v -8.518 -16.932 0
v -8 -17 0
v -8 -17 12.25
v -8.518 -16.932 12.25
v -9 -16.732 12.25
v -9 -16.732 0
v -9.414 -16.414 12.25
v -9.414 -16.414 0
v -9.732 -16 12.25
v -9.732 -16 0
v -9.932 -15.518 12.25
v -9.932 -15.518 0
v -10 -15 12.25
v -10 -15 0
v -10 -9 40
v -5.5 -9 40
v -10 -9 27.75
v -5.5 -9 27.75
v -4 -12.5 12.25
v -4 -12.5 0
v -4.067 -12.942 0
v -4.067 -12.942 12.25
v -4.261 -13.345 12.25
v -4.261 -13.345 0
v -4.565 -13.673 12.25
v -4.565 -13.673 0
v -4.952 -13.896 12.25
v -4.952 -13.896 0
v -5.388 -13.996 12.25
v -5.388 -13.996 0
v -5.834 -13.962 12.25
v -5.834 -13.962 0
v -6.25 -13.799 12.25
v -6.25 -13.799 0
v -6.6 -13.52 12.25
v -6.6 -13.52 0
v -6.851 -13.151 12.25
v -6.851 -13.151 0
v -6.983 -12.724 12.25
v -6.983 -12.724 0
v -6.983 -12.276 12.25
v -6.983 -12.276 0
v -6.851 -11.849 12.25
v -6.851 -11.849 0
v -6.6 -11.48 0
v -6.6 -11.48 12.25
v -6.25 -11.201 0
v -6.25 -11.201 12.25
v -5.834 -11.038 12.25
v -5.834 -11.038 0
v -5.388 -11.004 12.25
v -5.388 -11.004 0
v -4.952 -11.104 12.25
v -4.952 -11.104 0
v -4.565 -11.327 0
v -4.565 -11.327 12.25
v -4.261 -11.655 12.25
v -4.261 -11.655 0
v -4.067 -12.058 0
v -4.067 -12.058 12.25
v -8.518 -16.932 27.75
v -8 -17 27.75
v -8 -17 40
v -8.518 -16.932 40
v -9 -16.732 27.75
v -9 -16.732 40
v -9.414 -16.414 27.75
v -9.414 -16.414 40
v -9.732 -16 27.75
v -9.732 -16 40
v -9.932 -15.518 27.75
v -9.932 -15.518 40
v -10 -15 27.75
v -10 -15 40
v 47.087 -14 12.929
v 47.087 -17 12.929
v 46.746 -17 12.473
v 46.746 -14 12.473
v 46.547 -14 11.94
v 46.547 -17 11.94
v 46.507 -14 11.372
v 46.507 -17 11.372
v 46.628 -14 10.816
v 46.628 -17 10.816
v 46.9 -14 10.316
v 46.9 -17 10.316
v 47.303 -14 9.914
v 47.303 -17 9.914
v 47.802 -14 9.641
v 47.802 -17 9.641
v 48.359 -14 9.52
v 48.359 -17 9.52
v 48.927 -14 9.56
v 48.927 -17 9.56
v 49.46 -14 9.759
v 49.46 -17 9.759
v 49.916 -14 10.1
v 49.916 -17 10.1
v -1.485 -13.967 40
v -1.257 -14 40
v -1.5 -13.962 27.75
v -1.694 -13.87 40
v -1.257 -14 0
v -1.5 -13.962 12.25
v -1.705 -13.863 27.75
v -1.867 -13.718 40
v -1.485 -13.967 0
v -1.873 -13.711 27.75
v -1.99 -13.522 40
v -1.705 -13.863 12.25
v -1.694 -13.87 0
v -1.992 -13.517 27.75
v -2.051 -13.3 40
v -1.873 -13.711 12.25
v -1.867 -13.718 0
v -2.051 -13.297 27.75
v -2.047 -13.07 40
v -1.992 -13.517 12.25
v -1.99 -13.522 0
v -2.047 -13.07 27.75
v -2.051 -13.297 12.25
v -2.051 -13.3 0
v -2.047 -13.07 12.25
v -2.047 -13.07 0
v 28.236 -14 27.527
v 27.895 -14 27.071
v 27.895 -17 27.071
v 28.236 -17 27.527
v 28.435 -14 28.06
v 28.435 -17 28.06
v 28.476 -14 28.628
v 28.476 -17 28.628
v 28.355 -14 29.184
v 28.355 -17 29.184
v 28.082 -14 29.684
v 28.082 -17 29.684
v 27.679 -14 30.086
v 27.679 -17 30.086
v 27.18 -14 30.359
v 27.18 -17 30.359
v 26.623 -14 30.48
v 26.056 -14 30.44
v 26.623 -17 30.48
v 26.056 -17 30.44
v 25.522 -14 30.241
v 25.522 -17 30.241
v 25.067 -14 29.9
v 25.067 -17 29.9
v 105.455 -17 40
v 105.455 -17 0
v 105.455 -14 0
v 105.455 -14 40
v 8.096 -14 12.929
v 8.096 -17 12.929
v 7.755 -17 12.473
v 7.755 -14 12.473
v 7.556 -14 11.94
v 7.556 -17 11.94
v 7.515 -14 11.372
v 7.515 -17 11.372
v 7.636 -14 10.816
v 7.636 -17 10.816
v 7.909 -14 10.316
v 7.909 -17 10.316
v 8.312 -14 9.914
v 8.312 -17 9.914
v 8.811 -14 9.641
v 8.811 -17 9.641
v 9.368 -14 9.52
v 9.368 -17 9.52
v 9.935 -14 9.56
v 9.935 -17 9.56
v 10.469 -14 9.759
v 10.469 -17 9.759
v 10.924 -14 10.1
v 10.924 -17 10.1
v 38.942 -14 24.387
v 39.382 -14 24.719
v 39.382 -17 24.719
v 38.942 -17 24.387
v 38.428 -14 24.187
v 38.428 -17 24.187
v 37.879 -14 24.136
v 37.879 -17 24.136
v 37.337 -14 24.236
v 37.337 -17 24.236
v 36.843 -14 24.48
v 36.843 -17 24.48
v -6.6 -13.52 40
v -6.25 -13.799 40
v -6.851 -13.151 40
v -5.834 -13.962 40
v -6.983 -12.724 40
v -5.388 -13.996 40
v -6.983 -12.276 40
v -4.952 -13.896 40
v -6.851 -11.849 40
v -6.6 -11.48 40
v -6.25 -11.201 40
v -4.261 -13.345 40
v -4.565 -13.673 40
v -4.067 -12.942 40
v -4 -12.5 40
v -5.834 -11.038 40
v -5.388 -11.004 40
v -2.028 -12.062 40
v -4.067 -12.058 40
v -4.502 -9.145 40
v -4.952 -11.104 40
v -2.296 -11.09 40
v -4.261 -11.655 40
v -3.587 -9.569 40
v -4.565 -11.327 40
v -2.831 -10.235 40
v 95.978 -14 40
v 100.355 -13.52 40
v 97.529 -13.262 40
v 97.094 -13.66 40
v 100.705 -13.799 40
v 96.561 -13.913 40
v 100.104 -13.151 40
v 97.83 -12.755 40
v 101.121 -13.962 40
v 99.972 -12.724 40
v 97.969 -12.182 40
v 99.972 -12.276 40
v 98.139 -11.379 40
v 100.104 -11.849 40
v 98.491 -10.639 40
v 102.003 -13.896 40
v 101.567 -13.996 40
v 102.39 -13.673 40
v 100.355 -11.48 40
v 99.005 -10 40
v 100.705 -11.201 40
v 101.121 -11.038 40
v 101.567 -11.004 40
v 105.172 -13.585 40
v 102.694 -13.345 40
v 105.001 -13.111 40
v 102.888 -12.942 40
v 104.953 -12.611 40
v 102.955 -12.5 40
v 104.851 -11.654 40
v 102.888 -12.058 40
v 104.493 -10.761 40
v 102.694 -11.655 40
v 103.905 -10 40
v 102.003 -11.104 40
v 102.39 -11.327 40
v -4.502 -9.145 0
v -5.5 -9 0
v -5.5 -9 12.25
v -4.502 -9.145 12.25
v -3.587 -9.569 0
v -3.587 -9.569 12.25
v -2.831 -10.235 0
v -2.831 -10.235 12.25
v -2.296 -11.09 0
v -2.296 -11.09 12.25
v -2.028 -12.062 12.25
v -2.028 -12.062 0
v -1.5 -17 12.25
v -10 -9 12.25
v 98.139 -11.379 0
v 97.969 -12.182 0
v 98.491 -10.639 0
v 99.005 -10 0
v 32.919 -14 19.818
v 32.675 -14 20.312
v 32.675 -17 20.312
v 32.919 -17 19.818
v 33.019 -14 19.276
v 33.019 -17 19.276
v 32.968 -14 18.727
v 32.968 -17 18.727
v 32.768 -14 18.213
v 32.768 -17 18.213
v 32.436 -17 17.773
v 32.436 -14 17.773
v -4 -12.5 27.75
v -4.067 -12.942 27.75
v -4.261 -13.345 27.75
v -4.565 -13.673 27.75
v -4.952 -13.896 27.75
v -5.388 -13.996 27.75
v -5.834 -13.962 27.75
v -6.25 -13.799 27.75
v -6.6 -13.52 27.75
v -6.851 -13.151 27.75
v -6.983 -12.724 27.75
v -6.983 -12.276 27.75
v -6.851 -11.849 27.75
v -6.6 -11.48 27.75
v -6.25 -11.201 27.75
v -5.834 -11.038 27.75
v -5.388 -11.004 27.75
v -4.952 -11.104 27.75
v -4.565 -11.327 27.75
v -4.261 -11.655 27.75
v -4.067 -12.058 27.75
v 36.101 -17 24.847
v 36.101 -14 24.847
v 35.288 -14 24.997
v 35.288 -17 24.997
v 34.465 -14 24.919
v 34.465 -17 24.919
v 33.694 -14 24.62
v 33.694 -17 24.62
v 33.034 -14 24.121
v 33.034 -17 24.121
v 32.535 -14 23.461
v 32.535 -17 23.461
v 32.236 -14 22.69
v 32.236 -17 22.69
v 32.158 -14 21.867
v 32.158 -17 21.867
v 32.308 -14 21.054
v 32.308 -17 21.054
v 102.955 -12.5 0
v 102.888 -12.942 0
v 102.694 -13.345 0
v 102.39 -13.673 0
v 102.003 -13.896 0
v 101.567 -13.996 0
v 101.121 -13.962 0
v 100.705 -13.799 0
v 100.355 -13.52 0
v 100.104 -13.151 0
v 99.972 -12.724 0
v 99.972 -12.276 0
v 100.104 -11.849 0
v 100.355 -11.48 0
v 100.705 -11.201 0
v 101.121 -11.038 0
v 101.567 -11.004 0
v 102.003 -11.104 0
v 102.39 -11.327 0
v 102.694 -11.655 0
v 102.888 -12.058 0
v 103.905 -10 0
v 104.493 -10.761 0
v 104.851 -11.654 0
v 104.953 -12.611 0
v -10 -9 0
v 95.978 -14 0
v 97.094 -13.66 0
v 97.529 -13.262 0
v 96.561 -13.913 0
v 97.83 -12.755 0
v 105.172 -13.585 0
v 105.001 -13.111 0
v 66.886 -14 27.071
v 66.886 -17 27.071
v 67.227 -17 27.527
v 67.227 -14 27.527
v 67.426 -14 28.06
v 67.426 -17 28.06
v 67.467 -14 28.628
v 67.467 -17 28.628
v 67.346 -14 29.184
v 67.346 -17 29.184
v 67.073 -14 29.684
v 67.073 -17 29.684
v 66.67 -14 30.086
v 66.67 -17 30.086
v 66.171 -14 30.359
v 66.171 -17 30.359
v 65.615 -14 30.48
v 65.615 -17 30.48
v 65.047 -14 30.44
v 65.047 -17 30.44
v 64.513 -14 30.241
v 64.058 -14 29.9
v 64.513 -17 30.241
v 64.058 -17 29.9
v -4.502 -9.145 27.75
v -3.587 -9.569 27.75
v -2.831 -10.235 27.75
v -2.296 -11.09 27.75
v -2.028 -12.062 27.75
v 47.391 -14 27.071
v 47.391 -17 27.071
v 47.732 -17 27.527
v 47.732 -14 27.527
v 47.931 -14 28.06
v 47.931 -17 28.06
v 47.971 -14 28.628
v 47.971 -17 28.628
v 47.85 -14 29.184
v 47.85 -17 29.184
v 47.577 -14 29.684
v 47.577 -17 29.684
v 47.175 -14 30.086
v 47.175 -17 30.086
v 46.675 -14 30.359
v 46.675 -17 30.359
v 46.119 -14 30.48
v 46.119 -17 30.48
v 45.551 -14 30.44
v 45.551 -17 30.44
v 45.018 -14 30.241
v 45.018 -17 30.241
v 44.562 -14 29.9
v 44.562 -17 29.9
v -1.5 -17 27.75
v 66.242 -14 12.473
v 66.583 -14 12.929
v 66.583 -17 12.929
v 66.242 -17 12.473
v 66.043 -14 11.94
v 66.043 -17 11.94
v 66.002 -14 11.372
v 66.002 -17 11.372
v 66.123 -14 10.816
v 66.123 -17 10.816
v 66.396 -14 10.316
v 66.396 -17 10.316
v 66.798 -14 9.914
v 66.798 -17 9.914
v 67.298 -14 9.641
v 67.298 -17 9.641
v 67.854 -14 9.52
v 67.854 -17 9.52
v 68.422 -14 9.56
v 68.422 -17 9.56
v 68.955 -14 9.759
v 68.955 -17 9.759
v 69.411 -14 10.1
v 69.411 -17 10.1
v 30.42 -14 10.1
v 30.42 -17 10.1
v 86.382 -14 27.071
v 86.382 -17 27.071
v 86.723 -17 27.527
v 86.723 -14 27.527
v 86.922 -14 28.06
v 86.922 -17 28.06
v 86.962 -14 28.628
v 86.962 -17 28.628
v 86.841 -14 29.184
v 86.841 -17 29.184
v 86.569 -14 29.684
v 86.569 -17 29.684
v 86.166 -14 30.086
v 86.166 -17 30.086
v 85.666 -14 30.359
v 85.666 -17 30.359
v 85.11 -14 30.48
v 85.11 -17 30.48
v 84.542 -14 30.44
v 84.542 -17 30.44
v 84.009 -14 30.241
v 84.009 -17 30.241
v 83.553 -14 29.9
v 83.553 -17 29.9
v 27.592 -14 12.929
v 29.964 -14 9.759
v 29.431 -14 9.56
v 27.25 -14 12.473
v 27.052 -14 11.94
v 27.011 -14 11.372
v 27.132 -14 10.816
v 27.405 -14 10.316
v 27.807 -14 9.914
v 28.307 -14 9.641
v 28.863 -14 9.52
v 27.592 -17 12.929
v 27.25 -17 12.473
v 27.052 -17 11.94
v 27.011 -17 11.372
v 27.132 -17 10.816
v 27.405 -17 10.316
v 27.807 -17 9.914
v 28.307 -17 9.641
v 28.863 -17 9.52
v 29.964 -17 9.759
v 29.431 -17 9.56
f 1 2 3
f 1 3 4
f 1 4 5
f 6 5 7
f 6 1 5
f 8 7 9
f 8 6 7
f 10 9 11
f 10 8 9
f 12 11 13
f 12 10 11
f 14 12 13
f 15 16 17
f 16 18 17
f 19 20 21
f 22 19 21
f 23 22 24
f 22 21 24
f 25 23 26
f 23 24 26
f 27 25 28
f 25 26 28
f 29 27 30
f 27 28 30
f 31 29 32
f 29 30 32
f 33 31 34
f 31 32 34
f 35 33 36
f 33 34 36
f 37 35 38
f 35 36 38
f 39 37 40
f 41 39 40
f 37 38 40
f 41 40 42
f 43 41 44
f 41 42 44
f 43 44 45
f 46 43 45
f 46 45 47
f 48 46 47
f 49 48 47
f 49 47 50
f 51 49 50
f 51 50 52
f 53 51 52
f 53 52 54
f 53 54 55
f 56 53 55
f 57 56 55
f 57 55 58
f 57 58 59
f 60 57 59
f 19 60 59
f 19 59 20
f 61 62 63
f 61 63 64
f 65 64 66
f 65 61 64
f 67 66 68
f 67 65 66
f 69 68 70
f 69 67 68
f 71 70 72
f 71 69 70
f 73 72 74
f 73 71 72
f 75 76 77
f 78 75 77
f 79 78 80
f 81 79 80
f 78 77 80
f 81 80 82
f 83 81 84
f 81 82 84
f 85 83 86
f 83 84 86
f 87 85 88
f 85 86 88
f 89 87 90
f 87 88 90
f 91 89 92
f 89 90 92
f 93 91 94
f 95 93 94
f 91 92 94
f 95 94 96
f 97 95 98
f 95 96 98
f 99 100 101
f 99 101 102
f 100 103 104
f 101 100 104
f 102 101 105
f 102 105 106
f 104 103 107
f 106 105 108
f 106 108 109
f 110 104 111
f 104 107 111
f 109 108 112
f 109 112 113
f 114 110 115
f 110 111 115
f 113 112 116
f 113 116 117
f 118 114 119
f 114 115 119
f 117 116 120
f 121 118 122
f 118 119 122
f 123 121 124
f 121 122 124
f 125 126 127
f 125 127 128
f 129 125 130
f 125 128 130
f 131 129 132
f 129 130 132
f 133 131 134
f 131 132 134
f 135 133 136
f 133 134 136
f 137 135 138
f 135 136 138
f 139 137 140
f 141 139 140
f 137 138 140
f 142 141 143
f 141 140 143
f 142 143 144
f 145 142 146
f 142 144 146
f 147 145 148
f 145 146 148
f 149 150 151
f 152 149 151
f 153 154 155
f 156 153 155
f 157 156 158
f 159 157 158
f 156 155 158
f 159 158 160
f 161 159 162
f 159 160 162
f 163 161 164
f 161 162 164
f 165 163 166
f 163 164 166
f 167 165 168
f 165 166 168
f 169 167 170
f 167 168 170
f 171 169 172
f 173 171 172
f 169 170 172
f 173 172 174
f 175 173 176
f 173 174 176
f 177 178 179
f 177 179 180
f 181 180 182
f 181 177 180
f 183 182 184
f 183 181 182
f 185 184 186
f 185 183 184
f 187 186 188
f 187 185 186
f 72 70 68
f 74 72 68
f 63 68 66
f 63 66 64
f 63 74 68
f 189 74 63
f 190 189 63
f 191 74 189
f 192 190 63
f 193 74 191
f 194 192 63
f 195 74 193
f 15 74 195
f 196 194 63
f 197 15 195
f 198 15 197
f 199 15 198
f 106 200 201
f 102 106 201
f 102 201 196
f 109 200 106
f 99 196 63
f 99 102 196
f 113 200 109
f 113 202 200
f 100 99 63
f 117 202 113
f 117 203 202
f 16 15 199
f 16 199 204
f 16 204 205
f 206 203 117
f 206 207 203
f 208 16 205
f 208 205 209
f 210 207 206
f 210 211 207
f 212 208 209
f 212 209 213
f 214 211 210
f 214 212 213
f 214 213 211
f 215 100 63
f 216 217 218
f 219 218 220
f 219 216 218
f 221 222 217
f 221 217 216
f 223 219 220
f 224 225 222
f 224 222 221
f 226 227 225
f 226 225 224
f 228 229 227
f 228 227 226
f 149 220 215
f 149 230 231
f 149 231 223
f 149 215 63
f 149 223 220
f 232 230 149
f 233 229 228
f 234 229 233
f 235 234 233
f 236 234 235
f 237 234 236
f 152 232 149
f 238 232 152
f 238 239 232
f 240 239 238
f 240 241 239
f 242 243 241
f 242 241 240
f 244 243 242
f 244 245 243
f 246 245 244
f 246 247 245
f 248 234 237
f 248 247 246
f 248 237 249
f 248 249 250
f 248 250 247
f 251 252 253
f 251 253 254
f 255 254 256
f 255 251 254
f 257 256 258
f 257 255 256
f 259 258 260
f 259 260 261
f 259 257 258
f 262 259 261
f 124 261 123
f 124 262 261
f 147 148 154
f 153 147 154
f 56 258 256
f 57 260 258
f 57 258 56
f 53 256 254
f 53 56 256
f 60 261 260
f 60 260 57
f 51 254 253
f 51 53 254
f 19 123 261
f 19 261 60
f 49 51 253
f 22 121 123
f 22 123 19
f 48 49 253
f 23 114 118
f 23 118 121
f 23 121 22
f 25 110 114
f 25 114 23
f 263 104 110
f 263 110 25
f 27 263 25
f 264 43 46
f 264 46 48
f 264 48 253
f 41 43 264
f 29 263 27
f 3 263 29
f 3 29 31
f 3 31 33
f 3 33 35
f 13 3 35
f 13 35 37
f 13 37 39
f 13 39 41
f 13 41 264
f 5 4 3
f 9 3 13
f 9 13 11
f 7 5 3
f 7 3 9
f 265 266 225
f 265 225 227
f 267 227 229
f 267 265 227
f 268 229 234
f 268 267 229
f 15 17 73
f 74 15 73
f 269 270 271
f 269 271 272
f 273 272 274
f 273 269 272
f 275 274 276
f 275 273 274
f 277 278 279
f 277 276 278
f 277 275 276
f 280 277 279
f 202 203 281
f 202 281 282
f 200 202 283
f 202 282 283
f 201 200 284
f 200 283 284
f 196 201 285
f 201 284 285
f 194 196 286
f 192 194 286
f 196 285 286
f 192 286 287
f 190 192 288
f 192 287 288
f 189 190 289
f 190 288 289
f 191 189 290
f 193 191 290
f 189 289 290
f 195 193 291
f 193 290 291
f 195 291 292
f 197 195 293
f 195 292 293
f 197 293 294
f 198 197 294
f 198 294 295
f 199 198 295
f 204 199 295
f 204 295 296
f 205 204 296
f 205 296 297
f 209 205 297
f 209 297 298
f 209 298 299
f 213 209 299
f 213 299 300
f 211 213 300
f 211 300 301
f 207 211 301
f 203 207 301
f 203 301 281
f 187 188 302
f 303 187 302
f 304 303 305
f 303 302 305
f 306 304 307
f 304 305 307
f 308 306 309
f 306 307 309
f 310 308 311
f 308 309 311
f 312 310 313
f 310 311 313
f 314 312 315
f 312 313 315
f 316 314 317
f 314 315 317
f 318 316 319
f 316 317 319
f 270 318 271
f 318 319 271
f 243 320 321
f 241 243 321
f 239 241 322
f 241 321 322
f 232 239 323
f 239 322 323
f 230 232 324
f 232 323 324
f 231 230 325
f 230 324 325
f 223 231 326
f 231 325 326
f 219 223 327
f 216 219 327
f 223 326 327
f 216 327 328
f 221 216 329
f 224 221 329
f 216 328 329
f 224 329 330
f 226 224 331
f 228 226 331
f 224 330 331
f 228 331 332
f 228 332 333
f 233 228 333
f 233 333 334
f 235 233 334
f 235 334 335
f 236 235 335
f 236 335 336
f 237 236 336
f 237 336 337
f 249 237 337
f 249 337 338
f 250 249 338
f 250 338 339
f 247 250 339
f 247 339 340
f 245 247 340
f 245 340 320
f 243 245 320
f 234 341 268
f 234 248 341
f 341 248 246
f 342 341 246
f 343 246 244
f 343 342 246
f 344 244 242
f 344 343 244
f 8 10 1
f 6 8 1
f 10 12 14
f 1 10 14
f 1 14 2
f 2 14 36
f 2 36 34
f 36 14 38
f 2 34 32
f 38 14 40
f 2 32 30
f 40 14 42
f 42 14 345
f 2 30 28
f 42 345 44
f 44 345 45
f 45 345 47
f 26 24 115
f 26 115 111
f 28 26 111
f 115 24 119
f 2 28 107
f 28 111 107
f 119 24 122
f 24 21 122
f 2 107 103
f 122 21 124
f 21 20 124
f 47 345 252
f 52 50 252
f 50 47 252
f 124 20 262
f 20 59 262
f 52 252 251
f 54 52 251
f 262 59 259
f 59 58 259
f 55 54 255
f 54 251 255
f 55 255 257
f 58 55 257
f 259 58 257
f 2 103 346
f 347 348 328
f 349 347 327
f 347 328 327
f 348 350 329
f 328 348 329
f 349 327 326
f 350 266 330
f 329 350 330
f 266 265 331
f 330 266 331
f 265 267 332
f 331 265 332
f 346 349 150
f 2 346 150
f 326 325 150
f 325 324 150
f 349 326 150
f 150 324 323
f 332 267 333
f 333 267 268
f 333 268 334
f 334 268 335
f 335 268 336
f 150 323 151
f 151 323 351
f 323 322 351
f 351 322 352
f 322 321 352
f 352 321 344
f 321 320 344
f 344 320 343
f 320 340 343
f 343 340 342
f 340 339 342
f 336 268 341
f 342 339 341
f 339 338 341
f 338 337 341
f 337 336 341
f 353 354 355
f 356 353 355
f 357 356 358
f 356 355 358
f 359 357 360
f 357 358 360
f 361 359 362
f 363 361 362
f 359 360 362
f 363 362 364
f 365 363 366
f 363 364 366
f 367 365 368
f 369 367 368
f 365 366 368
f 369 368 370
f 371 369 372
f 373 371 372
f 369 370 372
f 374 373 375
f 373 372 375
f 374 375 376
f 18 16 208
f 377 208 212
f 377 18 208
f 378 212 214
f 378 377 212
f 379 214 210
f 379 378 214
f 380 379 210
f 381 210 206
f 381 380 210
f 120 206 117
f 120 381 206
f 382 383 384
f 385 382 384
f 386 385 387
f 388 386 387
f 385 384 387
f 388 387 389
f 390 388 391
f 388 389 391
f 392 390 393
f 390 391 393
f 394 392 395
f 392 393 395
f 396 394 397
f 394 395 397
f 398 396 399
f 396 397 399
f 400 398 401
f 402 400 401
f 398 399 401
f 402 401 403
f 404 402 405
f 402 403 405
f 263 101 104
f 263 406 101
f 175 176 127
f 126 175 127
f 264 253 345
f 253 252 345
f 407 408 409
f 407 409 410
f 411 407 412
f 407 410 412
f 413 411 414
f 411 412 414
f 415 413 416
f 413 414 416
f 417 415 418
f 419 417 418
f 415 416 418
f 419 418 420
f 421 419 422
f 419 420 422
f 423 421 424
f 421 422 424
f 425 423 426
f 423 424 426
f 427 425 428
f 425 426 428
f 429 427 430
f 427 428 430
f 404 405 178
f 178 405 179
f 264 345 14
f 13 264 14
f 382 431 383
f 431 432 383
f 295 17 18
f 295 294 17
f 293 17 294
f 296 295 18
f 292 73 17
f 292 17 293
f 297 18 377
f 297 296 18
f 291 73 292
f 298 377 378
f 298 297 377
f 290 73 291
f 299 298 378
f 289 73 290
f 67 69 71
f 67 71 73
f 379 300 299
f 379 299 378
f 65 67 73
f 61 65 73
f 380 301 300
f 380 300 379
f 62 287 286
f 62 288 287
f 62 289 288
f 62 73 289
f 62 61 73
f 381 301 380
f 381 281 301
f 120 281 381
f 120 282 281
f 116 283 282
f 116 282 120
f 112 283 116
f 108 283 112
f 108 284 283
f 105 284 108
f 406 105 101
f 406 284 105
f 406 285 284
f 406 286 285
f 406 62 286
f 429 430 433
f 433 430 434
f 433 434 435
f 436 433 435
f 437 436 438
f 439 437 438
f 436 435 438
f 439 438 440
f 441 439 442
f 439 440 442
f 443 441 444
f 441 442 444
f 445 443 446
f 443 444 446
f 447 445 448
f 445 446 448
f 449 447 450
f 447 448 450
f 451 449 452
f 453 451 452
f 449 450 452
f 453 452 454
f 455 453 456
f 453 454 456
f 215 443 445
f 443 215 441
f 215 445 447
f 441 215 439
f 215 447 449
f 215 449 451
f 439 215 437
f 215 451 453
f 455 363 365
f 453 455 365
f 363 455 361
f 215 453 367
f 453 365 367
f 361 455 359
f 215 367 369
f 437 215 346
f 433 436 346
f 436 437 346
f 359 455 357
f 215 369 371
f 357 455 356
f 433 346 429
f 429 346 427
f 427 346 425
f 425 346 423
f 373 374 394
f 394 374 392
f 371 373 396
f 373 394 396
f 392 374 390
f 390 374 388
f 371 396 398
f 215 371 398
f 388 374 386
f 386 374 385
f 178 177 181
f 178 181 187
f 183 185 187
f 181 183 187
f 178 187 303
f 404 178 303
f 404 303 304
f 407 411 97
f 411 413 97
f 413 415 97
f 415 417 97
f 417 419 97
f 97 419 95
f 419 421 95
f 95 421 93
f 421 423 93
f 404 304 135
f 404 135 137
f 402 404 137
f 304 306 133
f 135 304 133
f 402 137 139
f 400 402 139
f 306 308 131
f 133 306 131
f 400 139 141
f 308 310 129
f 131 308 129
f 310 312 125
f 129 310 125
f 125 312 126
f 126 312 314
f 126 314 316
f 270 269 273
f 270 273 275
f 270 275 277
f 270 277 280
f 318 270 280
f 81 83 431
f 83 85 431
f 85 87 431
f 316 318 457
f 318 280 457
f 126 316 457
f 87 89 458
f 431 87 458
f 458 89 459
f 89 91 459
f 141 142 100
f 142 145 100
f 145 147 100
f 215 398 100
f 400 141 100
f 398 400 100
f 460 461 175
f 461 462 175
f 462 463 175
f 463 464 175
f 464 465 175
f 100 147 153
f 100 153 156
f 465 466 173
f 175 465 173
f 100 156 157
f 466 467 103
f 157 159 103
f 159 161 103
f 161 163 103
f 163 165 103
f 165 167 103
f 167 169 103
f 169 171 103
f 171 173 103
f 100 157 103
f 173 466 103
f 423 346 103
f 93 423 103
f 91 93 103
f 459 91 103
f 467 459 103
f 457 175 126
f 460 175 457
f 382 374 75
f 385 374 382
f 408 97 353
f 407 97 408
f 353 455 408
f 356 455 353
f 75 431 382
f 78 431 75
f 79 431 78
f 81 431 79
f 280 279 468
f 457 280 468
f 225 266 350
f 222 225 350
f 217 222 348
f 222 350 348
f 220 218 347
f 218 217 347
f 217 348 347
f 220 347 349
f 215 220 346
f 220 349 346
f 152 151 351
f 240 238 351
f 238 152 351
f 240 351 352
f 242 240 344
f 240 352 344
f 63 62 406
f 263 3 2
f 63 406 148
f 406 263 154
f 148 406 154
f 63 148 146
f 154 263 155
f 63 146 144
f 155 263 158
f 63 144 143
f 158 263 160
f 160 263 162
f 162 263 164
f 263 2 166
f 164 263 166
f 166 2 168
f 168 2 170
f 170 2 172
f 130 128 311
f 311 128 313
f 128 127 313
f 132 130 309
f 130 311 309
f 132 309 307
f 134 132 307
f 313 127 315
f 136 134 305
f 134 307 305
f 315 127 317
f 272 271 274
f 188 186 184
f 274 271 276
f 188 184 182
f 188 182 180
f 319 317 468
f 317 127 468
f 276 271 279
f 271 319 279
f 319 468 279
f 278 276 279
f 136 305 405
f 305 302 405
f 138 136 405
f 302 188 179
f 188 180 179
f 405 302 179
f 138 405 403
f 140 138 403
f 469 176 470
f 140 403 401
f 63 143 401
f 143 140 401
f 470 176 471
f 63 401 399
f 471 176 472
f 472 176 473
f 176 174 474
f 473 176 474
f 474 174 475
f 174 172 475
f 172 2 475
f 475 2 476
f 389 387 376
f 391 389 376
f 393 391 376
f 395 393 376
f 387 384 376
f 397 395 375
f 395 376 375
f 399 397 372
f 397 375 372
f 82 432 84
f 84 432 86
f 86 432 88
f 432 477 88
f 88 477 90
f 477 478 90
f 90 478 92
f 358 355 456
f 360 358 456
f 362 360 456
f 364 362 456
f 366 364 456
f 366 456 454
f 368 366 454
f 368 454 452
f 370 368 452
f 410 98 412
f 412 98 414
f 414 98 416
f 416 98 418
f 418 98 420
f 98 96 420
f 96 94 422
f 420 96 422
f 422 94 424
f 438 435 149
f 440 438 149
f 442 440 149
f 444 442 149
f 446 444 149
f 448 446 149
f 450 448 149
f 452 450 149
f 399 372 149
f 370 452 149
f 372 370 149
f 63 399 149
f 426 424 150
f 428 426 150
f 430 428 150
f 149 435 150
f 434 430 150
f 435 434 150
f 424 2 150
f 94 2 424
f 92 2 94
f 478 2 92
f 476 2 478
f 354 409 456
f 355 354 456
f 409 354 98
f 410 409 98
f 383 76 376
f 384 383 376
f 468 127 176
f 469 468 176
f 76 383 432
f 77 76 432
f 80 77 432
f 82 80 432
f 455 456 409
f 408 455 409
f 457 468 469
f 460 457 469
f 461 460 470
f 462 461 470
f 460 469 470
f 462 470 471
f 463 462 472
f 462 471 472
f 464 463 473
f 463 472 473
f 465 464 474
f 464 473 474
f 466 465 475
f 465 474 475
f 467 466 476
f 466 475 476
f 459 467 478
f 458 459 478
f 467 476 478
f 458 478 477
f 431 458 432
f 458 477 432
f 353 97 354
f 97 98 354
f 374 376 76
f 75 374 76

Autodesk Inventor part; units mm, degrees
ref_plane "YZ Plane" through (0, 0, 0) normal (1, 0, 0) x (0, 1, 0)
ref_plane "XZ Plane" through (0, 0, 0) normal (0, 1, 0) x (-1, 0, 0)
sketch "Szkic1" plane through (0, 0, 0) normal (0, 0, 1) x (1, 0, 0)
  circle A0 centre (-5.5, -12.5) radius 1.5
  circle A1 centre (-5.5, 53.1646) radius 1.5
  circle A2 centre (101.455, -12.5) radius 1.5
  arc A3 (-10, -15) -> (-8, -17) centre (-8, -15) ccw
  line L0 (-8, -17) -> (136.455, -17)
  arc A4 (136.455, -17) -> (141.455, -12) centre (136.455, -12) ccw
  line L1 (141.455, -12) -> (141.455, -2)
  arc A5 (141.455, -2) -> (136.455, 3) centre (136.455, -2) ccw
  line L2 (136.455, 3) -> (127.455, 3)
  arc A6 (115.455, 15) -> (127.455, 3) centre (127.455, 15) ccw
  line L3 (115.455, 15) -> (115.455, 29.1646)
  arc A7 (127.455, 41.1646) -> (115.455, 29.1646) centre (127.455, 29.1646) ccw
  line L4 (127.455, 41.1646) -> (136.455, 41.1646)
  arc A8 (136.455, 41.1646) -> (141.455, 46.1646) centre (136.455, 46.1646) ccw
  line L5 (141.455, 46.1646) -> (141.455, 56.1646)
  arc A9 (141.455, 56.1646) -> (136.455, 61.1646) centre (136.455, 56.1646) ccw
  line L6 (136.455, 61.1646) -> (122.455, 61.1646)
  line L7 (107.455, 76.1646) -> (122.455, 61.1646)
  line L8 (107.455, 76.1646) -> (107.455, 88.1646)
  arc A10 (107.455, 88.1646) -> (102.455, 93.1646) centre (102.455, 88.1646) ccw
  line L9 (102.455, 93.1646) -> (92.455, 93.1646)
  arc A11 (92.455, 93.1646) -> (87.455, 88.1646) centre (92.455, 88.1646) ccw
  line L10 (87.455, 88.1646) -> (87.455, 79.1646)
  arc A12 (75.455, 67.1646) -> (87.455, 79.1646) centre (75.455, 79.1646) ccw
  line L11 (75.455, 67.1646) -> (22, 67.1646)
  arc A13 (10, 79.1646) -> (22, 67.1646) centre (22, 79.1646) ccw
  line L12 (10, 79.1646) -> (10, 88.1646)
  arc A14 (10, 88.1646) -> (5, 93.1646) centre (5, 88.1646) ccw
  line L13 (5, 93.1646) -> (-5, 93.1646)
  arc A15 (-5, 93.1646) -> (-10, 88.1646) centre (-5, 88.1646) ccw
  line L14 (-10, 88.1646) -> (-10, -15)
  circle A16 centre (97.455, 83.1646) radius 2
  circle A17 centre (131.455, -7) radius 2
  circle A18 centre (131.455, 51.1646) radius 2
  circle A19 centre (0, 83.1646) radius 2
  line L15 (89.5711, 35.5361) -> (89.5711, 17.5361)
  arc A20 (83.5711, 11.5361) -> (89.5711, 17.5361) centre (83.5711, 17.5361) ccw
  line L16 (83.5711, 11.5361) -> (78.5711, 11.5361)
  arc A21 (72.5711, 17.5361) -> (78.5711, 11.5361) centre (78.5711, 17.5361) ccw
  line L17 (72.5711, 17.5361) -> (72.5711, 35.5361)
  arc A22 (78.5711, 41.5361) -> (72.5711, 35.5361) centre (78.5711, 35.5361) ccw
  line L18 (78.5711, 41.5361) -> (83.5711, 41.5361)
  arc A23 (89.5711, 35.5361) -> (83.5711, 41.5361) centre (83.5711, 35.5361) ccw
  line L19 (107.455, 22.1646) -> (107.455, 25.6646)
  line L20 (107.455, 25.6646) -> (109.455, 25.6646)
  line L21 (109.455, 25.6646) -> (109.455, 22.1646)
  line L22 (109.455, 22.1646) -> (107.455, 22.1646)
  line L23 (82.5, 60.1646) -> (86, 60.1646)
  line L24 (86, 60.1646) -> (86, 58.1646)
  line L25 (86, 58.1646) -> (82.5, 58.1646)
  line L26 (82.5, 58.1646) -> (82.5, 60.1646)
  line L27 (53.5, 60.1646) -> (57, 60.1646)
  line L28 (57, 60.1646) -> (57, 58.1646)
  line L29 (57, 58.1646) -> (53.5, 58.1646)
  line L30 (53.5, 58.1646) -> (53.5, 60.1646)
  line L31 (24.5, 60.1646) -> (28, 60.1646)
  line L32 (28, 60.1646) -> (28, 58.1646)
  line L33 (28, 58.1646) -> (24.5, 58.1646)
  line L34 (24.5, 58.1646) -> (24.5, 60.1646)
  line L35 (10, 58.1646) -> (10, 60.1646)
  line L36 (10, 60.1646) -> (13.5, 60.1646)
  line L37 (13.5, 60.1646) -> (13.5, 58.1646)
  line L38 (13.5, 58.1646) -> (10, 58.1646)
  line L39 (39, 60.1646) -> (42.5, 60.1646)
  line L40 (42.5, 60.1646) -> (42.5, 58.1646)
  line L41 (42.5, 58.1646) -> (39, 58.1646)
  line L42 (39, 58.1646) -> (39, 60.1646)
  line L43 (68, 60.1646) -> (71.5, 60.1646)
  line L44 (71.5, 60.1646) -> (71.5, 58.1646)
  line L45 (71.5, 58.1646) -> (68, 58.1646)
  line L46 (68, 58.1646) -> (68, 60.1646)
  line L47 (107.455, 37.6646) -> (107.455, 41.1646)
  line L48 (107.455, 41.1646) -> (109.455, 41.1646)
  line L49 (109.455, 41.1646) -> (109.455, 37.6646)
  line L50 (109.455, 37.6646) -> (107.455, 37.6646)
  line L51 (107.455, 6.6646) -> (107.455, 10.1646)
  line L52 (107.455, 10.1646) -> (109.455, 10.1646)
  line L53 (109.455, 10.1646) -> (109.455, 6.6646)
  line L54 (109.455, 6.6646) -> (107.455, 6.6646)
  line L55 (54.7961, 40.5361) -> (54.7961, 12.5361)
  arc A24 (48.7961, 6.5361) -> (54.7961, 12.5361) centre (48.7961, 12.5361) ccw
  line L56 (48.7961, 6.5361) -> (30.7961, 6.5361)
  arc A25 (24.7961, 12.5361) -> (30.7961, 6.5361) centre (30.7961, 12.5361) ccw
  line L57 (24.7961, 12.5361) -> (24.7961, 40.5361)
  arc A26 (30.7961, 46.5361) -> (24.7961, 40.5361) centre (30.7961, 40.5361) ccw
  line L58 (30.7961, 46.5361) -> (48.7961, 46.5361)
  arc A27 (54.7961, 40.5361) -> (48.7961, 46.5361) centre (48.7961, 40.5361) ccw
  circle A28 centre (65.8311, 7.4861) radius 1.6
  circle A29 centre (15.0311, 50.6661) radius 1.6
  circle A30 centre (89.9611, 50.6661) radius 1.6
  circle A31 centre (13.7611, 2.4061) radius 1.6
  circle A32 centre (65.8311, 35.4261) radius 1.6
  circle A33 centre (96.3111, 2.4061) radius 1.6
  line L59 (105.455, -17) -> (105.455, -14)
  line L60 (105.455, -14) -> (-10, -14)
  arc A34 (-2.3377, -14) -> (-8.6623, -14) centre (-5.5, -12.5) ccw
  arc A35 (104.6173, -14) -> (98.2927, -14) centre (101.455, -12.5) ccw
  line L61 (-5.5, -9) -> (-10, -9)
  point P0 (0, 0)
  point P1 (0, 0)
  dimension "d0" = 3
  dimension "d1" = 36
  dimension "d2" = 7
  dimension "d3" = 7
extrude "Wyciągnięcie proste1" add sketch "Szkic1" along normal blind 40 contours L60 A34 | L60 L59 L0 A3 L14 | L60 L14 L61 A34 | A35 L60
fillet "Zaokrąglenie1" radius 2 2 edges at (98.2927, -14, 20) (104.6173, -14, 20)
fillet "Zaokrąglenie1" radius 0.8 1 edges at (-2.3377, -14, 20)
sketch "Szkic2" plane through (-8, -17, 0) normal (0, -1, 0) x (1, 0, 0)
  line L0 (0, 0) -> (113.455, 0) projected
  line L1 (113.455, 0) -> (113.455, 40) projected
  line L2 (0, 40) -> (113.455, 40) projected
  line L3 (0, 0) -> (0, 40) projected
  line L4 (-2, 0) -> (-2, 40) projected
  line L5 (-2, 0) -> (-2, 40) projected
  line L6 (-2, 27.75) -> (6.5, 27.75)
  line L7 (6.5, 27.75) -> (6.5, 12.25)
  line L8 (6.5, 12.25) -> (-2, 12.25)
  line L9 (-2, 12.25) -> (-2, 27.75)
  point P0 (8, 0)
  dimension "d7" = 8.5
  dimension "d8" = 15.5
  dimension "d9" = 40
  dimension "d10" = 12.25
extrude "Wyciągnięcie proste2" cut sketch "Szkic2" against normal through all contours L8 L4 L6 L3 | L3 L6 L7 L8
sketch "Szkic3" plane through (-8, -17, 0) normal (0, -1, 0) x (1, 0, 0)
  line L0 (6.5, 12.25) -> (0, 12.25) projected
  line L1 (0, 0) -> (0, 12.25) projected
  line L2 (0, 0) -> (113.455, 0) projected
  line L3 (113.455, 0) -> (113.455, 40) projected
  line L4 (0, 40) -> (113.455, 40) projected
  line L5 (0, 27.75) -> (0, 40) projected
  line L6 (0, 27.75) -> (6.5, 27.75) projected
  line L7 (6.5, 27.75) -> (6.5, 12.25) projected
  line L8 (103.9778, 0) -> (103.9778, 40) projected
  line L9 (17.5103, 11.5147) -> (34.4808, 28.4853) construction
  line L10 (18.9245, 10.1005) -> (35.8951, 27.0711)
  line L11 (33.0666, 29.8995) -> (16.0961, 12.9289)
  arc A0 (16.0961, 12.9289) -> (18.9245, 10.1005) centre (17.5103, 11.5147) ccw
  arc A1 (35.8951, 27.0711) -> (33.0666, 29.8995) centre (34.4808, 28.4853) ccw
  line L12 (25.9956, 20) -> (49.9956, 20) construction
  line L13 (37.0058, 11.5147) -> (53.9764, 28.4853) construction
  line L14 (38.42, 10.1005) -> (55.3906, 27.0711)
  line L15 (52.5622, 29.8995) -> (35.5916, 12.9289)
  arc A2 (35.5916, 12.9289) -> (38.42, 10.1005) centre (37.0058, 11.5147) ccw
  arc A3 (55.3906, 27.0711) -> (52.5622, 29.8995) centre (53.9764, 28.4853) ccw
  line L16 (45.4911, 20) -> (69.4911, 20) construction
  line L17 (56.5014, 11.5147) -> (73.472, 28.4853) construction
  line L18 (57.9156, 10.1005) -> (74.8862, 27.0711)
  line L19 (72.0577, 29.8995) -> (55.0872, 12.9289)
  arc A4 (55.0872, 12.9289) -> (57.9156, 10.1005) centre (56.5014, 11.5147) ccw
  arc A5 (74.8862, 27.0711) -> (72.0577, 29.8995) centre (73.472, 28.4853) ccw
  line L20 (64.9867, 20) -> (88.9867, 20) construction
  line L21 (75.997, 11.5147) -> (92.9675, 28.4853) construction
  line L22 (77.4112, 10.1005) -> (94.3817, 27.0711)
  line L23 (91.5533, 29.8995) -> (74.5827, 12.9289)
  arc A6 (74.5827, 12.9289) -> (77.4112, 10.1005) centre (75.997, 11.5147) ccw
  arc A7 (94.3817, 27.0711) -> (91.5533, 29.8995) centre (92.9675, 28.4853) ccw
  line L24 (84.4822, 20) -> (108.4822, 20) construction
  arc A8 (45.8917, 23.229) -> (41.926, 19.2633) centre (43.155, 22) ccw
  point P0 (8, 0)
  dimension "d13" = 40
  dimension "d14" = 20
  dimension "d15" = 20
  dimension "d16" = 20
  dimension "d17" = 20
  dimension "d19" = 97.4778
  dimension "d20" = 19.4956
  dimension "d21" = 19.4956
  dimension "d22" = 19.4956
  dimension "d23" = 19.4956
  dimension "d24" = 12
  dimension "d25" = 45
  dimension "d26" = 4
  dimension "d27" = 12
  dimension "d28" = 45
  dimension "d29" = 4
  dimension "d30" = 12
  dimension "d31" = 45
  dimension "d32" = 4
  dimension "d33" = 12
  dimension "d34" = 45
  dimension "d35" = 4
  dimension "d38" = 18
  dimension "d39" = 70.3
  dimension "d40" = 6
extrude "Wyciągnięcie proste3" cut sketch "Szkic3" against normal through all contours A0 L11 A1 L10 | A2 L15 A3 L14 | A8 L15 | A4 L19 A5 L18 | A6 L23 A7 L22
fillet "Zaokrąglenie2" radius 2 2 edges at (33.926, -15.5, 19.2633) (37.8917, -15.5, 23.229)
ref_plane "Płaszczyzna konstrukcyjna1" through (101.455, -9, 0) normal (0, 1, 0) x (-1, 0, 0)
sketch "Szkic4" plane through (101.455, -9, 0) normal (0, 1, 0) x (-1, 0, 0)
  line L0 (16.8478, 48.5064) -> (-17.7331, 48.5064)
  line L1 (-17.7331, 48.5064) -> (-17.7331, -24.0755)
  line L2 (-17.7331, -24.0755) -> (16.8478, -24.0755)
  line L3 (16.8478, -24.0755) -> (16.8478, 48.5064)
  point P0 (101.455, 0)
extrude "Wyciągnięcie proste4" cut sketch "Szkic4" against normal blind 1
equation "\"d10\" = -0.5 * d8 + 0.5 * d9"
equation "\"d16\" = d15"
equation "\"d17\" = d15"
equation "\"d20\" = 0.2 * d19"
equation "\"d21\" = d20"
equation "\"d22\" = d20"
equation "\"d23\" = d20"
properties part number "3DP_PLA_Controller_Case_Side_Wall_Longer"
